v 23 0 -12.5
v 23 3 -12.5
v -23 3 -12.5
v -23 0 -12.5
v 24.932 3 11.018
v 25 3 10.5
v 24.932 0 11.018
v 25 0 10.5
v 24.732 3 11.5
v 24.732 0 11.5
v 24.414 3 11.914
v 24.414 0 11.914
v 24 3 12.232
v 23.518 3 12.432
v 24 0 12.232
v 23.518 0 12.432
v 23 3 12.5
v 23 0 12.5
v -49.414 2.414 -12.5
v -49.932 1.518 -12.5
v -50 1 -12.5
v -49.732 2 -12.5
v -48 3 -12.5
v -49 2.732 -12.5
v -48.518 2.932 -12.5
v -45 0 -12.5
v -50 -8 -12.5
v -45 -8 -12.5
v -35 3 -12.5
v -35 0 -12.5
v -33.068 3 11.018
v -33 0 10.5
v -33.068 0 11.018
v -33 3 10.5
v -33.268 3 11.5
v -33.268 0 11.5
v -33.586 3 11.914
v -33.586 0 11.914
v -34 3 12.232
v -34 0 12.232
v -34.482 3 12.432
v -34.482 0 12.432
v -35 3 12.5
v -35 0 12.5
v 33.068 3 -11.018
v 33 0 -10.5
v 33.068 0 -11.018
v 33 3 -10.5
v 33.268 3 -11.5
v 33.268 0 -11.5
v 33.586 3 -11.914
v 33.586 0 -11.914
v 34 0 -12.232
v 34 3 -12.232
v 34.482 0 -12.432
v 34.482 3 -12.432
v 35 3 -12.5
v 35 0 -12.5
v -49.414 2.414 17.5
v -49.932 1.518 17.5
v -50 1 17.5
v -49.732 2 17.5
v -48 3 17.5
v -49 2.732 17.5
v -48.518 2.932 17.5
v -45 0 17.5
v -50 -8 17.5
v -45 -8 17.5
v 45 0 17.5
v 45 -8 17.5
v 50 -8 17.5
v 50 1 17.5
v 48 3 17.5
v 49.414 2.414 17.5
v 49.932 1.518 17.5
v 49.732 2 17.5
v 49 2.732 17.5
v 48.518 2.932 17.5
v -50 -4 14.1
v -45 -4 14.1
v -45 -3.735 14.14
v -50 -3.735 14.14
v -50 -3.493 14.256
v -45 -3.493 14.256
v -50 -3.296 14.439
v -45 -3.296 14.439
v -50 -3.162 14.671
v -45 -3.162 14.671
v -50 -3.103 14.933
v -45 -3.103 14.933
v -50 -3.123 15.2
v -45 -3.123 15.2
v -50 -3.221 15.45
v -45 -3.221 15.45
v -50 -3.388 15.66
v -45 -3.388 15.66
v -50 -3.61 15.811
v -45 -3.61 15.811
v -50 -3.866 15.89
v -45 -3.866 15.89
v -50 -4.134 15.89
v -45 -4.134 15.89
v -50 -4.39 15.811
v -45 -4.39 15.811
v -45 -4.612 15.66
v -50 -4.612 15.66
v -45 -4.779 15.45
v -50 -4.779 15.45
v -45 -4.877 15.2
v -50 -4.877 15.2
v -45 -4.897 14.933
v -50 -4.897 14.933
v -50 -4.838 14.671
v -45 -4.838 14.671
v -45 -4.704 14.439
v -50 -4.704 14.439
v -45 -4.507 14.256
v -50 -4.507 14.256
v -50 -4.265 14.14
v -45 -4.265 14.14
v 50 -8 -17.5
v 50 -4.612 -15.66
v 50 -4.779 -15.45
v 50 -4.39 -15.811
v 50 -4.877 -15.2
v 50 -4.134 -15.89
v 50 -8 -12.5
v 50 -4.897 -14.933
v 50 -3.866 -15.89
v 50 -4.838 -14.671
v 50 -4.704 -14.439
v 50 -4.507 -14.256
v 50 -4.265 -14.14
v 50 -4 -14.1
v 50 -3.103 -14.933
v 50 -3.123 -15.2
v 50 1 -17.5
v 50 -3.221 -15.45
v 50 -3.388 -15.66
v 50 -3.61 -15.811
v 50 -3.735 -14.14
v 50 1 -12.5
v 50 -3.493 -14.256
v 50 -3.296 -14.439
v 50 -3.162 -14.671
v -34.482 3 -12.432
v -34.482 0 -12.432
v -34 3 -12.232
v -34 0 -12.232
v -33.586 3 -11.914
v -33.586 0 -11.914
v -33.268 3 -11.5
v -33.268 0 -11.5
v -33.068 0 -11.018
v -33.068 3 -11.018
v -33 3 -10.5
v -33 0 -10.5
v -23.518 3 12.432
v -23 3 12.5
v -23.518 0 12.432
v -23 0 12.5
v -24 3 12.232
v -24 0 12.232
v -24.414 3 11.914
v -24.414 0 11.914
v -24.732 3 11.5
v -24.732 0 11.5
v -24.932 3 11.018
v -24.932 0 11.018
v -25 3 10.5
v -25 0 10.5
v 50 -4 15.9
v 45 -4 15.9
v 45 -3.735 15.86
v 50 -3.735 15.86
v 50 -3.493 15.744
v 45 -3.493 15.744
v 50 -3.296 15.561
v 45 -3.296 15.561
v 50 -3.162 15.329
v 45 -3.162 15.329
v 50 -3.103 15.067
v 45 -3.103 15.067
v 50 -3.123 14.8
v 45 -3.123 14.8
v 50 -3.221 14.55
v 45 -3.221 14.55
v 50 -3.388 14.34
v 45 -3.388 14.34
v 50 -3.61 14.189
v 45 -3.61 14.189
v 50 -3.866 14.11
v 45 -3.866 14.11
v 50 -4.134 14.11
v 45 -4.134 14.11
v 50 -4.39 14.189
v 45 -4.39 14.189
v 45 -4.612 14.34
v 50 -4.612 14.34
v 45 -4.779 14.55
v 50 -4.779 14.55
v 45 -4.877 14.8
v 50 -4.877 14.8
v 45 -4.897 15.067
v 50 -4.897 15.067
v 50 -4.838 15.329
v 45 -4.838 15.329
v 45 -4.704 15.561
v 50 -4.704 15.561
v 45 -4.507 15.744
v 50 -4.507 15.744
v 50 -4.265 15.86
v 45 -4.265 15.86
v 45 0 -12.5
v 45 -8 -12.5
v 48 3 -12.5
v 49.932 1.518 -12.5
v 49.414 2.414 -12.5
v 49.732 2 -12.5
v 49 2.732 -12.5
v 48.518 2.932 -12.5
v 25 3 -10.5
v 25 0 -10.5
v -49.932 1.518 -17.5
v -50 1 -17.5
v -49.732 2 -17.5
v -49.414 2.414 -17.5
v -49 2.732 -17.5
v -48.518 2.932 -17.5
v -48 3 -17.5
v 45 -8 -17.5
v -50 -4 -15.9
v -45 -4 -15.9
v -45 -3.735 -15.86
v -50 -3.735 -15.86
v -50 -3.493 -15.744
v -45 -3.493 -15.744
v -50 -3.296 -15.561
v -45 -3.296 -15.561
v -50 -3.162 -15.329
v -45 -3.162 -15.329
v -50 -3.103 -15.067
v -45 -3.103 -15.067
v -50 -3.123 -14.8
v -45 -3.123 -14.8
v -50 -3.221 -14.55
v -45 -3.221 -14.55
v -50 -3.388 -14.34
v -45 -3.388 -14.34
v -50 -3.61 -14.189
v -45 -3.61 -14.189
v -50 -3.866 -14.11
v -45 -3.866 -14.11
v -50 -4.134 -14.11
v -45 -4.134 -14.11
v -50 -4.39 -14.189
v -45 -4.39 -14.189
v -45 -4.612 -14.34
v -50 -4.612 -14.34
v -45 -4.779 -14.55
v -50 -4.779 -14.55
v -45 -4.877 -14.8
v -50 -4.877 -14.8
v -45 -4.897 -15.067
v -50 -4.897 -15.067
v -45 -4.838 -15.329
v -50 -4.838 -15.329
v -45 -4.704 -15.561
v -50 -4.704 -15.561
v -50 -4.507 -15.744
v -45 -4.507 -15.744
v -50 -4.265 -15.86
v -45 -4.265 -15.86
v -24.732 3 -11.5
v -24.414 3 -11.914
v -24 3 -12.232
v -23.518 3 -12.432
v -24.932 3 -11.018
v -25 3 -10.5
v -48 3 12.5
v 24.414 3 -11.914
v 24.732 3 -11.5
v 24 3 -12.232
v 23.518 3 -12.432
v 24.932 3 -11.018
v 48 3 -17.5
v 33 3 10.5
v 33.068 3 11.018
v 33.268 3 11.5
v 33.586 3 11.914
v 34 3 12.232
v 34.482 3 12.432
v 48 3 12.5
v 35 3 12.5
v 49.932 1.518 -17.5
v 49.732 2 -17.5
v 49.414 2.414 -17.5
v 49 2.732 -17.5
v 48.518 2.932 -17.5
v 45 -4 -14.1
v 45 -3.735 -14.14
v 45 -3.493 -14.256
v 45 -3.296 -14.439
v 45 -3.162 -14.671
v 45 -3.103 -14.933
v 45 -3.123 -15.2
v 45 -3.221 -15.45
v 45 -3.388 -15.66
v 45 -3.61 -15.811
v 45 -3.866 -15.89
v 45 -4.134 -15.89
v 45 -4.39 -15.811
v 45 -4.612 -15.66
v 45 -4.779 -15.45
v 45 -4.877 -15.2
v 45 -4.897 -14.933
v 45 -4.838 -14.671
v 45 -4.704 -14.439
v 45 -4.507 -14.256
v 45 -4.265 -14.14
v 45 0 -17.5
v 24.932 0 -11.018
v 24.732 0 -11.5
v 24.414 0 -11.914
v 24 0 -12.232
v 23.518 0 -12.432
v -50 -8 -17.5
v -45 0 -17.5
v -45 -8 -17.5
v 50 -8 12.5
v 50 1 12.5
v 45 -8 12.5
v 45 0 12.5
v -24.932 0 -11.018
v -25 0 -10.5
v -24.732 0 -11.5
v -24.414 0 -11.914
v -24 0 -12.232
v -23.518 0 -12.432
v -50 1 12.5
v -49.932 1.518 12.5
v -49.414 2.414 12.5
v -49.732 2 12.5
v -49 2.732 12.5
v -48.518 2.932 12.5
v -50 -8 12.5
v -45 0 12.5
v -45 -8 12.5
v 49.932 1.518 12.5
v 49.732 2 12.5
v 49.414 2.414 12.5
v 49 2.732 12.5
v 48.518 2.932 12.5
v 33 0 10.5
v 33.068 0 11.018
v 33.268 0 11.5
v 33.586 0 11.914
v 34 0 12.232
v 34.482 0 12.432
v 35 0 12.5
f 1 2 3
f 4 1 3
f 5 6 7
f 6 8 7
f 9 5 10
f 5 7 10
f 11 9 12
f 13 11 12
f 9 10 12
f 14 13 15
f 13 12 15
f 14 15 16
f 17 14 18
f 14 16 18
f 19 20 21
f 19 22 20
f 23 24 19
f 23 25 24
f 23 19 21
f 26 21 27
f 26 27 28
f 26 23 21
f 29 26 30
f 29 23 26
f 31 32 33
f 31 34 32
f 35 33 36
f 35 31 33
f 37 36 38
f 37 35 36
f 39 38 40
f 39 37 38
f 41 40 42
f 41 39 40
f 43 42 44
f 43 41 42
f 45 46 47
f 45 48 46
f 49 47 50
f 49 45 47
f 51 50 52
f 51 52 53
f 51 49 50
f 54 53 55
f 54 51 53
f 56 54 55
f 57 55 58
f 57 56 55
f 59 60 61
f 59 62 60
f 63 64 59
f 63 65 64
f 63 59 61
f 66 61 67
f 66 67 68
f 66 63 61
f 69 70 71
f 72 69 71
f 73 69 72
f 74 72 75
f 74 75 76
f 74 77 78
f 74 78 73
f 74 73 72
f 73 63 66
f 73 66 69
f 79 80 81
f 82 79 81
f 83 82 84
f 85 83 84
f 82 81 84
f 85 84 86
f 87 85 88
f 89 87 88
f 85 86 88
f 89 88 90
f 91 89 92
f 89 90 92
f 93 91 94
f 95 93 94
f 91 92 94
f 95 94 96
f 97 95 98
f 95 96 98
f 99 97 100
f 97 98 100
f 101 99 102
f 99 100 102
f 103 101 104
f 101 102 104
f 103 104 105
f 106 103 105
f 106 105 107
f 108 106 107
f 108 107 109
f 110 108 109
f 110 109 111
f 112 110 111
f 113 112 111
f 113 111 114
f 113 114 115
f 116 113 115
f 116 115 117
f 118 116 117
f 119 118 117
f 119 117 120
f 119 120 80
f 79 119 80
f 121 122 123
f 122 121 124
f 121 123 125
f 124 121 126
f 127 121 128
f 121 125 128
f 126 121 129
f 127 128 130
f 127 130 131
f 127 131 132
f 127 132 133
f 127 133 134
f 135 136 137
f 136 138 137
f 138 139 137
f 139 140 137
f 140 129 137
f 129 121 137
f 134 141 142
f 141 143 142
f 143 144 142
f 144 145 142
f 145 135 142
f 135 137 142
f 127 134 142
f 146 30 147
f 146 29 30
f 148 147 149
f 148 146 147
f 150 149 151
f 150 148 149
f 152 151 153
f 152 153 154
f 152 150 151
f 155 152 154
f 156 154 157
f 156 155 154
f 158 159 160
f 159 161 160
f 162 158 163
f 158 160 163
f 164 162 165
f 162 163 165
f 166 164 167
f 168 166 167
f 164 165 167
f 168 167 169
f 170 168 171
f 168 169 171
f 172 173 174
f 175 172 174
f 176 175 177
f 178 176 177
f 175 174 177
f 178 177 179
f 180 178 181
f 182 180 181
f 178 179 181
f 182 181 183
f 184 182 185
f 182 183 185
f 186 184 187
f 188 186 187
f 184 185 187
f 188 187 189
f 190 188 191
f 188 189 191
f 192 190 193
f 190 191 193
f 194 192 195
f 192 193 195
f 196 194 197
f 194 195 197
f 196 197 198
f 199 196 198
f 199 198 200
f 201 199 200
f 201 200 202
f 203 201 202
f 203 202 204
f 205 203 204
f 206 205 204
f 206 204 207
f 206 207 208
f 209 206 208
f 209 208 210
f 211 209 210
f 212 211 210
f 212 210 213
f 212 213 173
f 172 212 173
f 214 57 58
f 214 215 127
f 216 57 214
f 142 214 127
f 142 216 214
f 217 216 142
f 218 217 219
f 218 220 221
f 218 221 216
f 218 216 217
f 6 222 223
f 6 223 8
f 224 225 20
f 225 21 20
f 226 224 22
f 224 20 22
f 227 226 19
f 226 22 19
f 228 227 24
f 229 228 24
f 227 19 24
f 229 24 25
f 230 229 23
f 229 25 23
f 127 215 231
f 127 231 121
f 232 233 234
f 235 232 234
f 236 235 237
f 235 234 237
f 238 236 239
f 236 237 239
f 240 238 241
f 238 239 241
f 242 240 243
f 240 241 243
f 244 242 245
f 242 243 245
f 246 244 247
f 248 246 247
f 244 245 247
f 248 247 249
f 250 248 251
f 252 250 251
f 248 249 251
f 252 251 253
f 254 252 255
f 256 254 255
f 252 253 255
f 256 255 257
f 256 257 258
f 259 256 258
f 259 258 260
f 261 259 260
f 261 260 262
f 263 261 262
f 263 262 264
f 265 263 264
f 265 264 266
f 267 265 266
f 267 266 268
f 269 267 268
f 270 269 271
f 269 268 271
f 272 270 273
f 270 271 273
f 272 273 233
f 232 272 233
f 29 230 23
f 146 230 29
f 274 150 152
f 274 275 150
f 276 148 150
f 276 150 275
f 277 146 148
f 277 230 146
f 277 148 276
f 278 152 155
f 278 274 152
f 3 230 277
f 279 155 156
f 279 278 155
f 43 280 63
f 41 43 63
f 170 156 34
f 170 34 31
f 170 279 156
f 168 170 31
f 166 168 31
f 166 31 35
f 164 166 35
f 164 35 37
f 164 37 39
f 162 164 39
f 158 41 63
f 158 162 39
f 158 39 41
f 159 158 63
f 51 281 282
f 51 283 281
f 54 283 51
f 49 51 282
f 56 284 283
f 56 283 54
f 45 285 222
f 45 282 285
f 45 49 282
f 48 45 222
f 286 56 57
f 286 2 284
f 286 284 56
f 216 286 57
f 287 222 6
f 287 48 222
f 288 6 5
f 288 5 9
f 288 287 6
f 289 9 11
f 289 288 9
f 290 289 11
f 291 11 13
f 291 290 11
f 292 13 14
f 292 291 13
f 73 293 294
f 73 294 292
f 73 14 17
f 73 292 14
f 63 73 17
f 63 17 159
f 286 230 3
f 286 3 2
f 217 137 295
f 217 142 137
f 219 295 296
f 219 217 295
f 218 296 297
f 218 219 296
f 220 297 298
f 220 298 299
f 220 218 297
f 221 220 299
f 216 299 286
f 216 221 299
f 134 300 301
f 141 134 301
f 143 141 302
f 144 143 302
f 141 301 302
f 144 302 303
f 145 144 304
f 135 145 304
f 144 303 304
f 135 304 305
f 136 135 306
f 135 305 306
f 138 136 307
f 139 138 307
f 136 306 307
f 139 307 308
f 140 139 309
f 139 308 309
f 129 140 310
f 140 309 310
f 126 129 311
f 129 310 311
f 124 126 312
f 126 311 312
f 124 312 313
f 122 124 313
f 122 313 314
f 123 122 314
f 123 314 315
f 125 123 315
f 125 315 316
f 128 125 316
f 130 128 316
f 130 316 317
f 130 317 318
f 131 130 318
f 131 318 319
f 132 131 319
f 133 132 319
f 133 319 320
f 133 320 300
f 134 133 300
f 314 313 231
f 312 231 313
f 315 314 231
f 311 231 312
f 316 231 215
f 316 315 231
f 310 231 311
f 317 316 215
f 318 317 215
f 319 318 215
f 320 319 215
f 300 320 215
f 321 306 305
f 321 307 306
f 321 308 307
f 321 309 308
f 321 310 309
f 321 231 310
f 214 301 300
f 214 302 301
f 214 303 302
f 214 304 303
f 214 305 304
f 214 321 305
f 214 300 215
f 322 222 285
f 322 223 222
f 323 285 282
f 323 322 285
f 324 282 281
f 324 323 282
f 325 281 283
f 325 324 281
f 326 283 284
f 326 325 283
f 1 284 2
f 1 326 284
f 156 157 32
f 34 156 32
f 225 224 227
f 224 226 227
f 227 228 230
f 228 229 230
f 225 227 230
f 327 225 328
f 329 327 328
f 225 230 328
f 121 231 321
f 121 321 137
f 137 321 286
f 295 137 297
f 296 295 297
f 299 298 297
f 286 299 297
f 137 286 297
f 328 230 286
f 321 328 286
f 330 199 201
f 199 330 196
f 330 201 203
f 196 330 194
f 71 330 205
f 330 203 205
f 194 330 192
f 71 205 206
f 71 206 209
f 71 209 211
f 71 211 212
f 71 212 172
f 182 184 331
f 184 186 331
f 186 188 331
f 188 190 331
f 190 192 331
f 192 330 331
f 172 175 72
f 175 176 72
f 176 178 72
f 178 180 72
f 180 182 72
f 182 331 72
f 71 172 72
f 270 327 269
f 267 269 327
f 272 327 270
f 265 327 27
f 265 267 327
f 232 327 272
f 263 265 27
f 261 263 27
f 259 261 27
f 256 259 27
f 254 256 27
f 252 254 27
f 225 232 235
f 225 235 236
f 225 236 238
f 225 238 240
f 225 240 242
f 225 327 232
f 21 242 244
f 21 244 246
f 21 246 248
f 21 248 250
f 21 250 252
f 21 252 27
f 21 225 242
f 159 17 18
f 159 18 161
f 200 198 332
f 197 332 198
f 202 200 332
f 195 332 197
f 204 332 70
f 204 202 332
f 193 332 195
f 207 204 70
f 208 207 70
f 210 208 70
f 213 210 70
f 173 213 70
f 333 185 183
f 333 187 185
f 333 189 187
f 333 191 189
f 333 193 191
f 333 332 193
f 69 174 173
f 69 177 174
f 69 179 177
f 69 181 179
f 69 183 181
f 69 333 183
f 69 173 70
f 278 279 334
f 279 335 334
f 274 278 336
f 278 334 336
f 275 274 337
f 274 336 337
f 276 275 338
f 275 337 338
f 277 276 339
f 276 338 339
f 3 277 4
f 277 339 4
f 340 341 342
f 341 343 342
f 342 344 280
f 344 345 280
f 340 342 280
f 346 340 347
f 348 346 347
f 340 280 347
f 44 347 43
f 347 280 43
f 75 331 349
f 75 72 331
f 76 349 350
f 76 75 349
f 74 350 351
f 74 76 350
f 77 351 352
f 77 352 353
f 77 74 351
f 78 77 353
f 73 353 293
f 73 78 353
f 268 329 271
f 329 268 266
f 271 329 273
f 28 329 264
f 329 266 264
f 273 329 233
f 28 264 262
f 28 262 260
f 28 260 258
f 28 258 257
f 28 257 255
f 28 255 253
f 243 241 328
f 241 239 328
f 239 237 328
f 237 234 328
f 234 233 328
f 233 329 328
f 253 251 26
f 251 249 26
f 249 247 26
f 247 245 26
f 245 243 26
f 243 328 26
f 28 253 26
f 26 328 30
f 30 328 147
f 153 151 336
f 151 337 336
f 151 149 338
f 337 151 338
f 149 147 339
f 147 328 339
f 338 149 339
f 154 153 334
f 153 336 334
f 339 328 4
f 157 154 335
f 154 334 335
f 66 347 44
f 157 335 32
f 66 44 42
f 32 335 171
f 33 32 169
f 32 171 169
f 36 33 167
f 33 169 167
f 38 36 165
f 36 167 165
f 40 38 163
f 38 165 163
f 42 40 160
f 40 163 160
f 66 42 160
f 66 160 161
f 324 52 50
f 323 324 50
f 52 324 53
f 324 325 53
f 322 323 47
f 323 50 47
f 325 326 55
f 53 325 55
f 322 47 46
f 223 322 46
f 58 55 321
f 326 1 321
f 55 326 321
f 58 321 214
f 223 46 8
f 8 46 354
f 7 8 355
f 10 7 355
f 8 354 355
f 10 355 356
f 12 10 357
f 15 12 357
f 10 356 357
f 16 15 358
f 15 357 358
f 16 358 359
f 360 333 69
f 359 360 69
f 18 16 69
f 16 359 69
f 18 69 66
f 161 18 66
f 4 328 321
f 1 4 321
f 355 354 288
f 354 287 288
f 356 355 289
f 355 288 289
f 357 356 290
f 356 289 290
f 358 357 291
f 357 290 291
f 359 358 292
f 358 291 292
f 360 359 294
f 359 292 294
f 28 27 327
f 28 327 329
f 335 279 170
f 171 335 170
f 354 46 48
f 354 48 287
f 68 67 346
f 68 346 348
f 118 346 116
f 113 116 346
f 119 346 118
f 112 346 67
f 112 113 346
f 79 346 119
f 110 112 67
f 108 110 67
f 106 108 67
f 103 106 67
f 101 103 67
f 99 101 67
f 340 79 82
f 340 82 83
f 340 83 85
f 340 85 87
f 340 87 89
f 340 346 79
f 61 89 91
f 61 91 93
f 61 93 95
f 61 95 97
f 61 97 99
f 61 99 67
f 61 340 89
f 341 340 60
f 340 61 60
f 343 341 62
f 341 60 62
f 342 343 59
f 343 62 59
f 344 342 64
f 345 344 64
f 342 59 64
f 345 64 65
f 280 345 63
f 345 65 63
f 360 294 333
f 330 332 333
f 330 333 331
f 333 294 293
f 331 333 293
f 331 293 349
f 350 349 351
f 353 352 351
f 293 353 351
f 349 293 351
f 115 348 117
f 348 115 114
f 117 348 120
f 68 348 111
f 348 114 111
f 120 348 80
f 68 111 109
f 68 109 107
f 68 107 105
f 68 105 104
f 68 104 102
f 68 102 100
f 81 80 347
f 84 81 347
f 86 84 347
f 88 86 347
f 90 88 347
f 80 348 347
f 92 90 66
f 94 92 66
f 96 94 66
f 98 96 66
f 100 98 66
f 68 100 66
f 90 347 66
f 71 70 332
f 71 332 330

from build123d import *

# Parameters (mm, degrees)
SKETCH_1_W                  = 100
SKETCH_1_H                  = 35
EXTRUDE_1_DEPTH             = 3
SKETCH_2_W                  = 17
SKETCH_2_H                  = 25
CUT_EXTRUDE_1_DEPTH         = 54.058929503
SKETCH_3_W                  = 5
SKETCH_3_H                  = 5
EXTRUDE_2_DEPTH             = 8
SKETCH_4_W                  = 5
SKETCH_4_H                  = 5
EXTRUDE_3_DEPTH             = 8
SKETCH_5_W                  = 17
SKETCH_5_H                  = 30
CUT_EXTRUDE_2_DEPTH         = 54.574714185
SKETCH_6_W                  = 5
SKETCH_6_H                  = 5
EXTRUDE_4_DEPTH             = 8
SKETCH_7_W                  = 5
SKETCH_7_H                  = 3
EXTRUDE_5_DEPTH             = 17
SKETCH_8_W                  = 5
SKETCH_8_H                  = 5
EXTRUDE_6_DEPTH             = 8
SKETCH_9_W                  = 50
SKETCH_9_H                  = 25
CUT_EXTRUDE_3_DEPTH         = 55.104066391
HOLE_WIZARD_1_8_1_8_1_D     = 1.8
HOLE_WIZARD_1_8_1_8_1_DEPTH = 5
HOLE_WIZARD_1_8_1_8_2_D     = 1.8
HOLE_WIZARD_1_8_1_8_2_DEPTH = 100
FILLET_1_R                  = 2


with BuildPart() as part:
    # 草图1 → 凸台-拉伸1 (new body)
    with BuildSketch(Plane.XZ):
        Rectangle(SKETCH_1_W, SKETCH_1_H)
    extrude(amount=-EXTRUDE_1_DEPTH)

    # 草图2 → 切除-拉伸1 (cut, through all)
    with BuildSketch(Plane.XZ):
        with Locations((41.5, 0)):
            Rectangle(SKETCH_2_W, SKETCH_2_H)
    extrude(amount=-CUT_EXTRUDE_1_DEPTH, mode=Mode.SUBTRACT)

    # 草图3 → 凸台-拉伸2 (add)
    with BuildSketch(Plane.XZ):
        with Locations((47.5, -15)):
            Rectangle(SKETCH_3_W, SKETCH_3_H)
    extrude(amount=EXTRUDE_2_DEPTH)

    # 草图4 → 凸台-拉伸3 (add)
    with BuildSketch(Plane.XZ):
        with Locations((47.5, 15)):
            Rectangle(SKETCH_4_W, SKETCH_4_H)
    extrude(amount=EXTRUDE_3_DEPTH)

    # 草图5 → 切除-拉伸2 (cut, through all)
    with BuildSketch(Plane.XZ):
        with Locations((-41.5, 2.5)):
            Rectangle(SKETCH_5_W, SKETCH_5_H)
    extrude(amount=-CUT_EXTRUDE_2_DEPTH, mode=Mode.SUBTRACT)

    # 草图6 → 凸台-拉伸4 (add)
    with BuildSketch(Plane.XZ):
        with Locations((-47.5, -15)):
            Rectangle(SKETCH_6_W, SKETCH_6_H)
    extrude(amount=EXTRUDE_4_DEPTH)

    # 草图7 → 凸台-拉伸5 (add)
    with BuildSketch(Plane.ZY.offset(33)):
        with Locations((15, 1.5)):
            Rectangle(SKETCH_7_W, SKETCH_7_H)
    extrude(amount=EXTRUDE_5_DEPTH)

    # 草图8 → 凸台-拉伸6 (add)
    with BuildSketch(Plane.XZ):
        with Locations((-47.5, 15)):
            Rectangle(SKETCH_8_W, SKETCH_8_H)
    extrude(amount=EXTRUDE_6_DEPTH)

    # 草图9 → 切除-拉伸3 (cut, through all)
    with BuildSketch(Plane(origin=(0, 3, 0), x_dir=(-1, 0, 0), z_dir=(0, 1, 0))):
        Rectangle(SKETCH_9_W, SKETCH_9_H)
    extrude(amount=-CUT_EXTRUDE_3_DEPTH, mode=Mode.SUBTRACT)

    # Ø1.8 (1.8) 直径孔1
    with Locations(Plane.ZY.offset(50)):
        with Locations((15, -4), (-15, -4)):
            Hole(HOLE_WIZARD_1_8_1_8_1_D / 2, depth=HOLE_WIZARD_1_8_1_8_1_DEPTH)

    # Ø1.8 (1.8) 直径孔2
    with Locations(Plane(origin=(50, 0, 0), x_dir=(0, 0, -1), z_dir=(1, 0, 0))):
        with Locations((15, -4), (-15, -4)):
            Hole(HOLE_WIZARD_1_8_1_8_2_D / 2, depth=HOLE_WIZARD_1_8_1_8_2_DEPTH)

    # 圆角1
    fillet_1_edges = [part.edges().sort_by_distance(p)[0] for p in [
        (-25, 1.5, -12.5),
        (25, 1.5, -12.5),
        (25, 1.5, 12.5),
        (-25, 1.5, 12.5),
        (50, 3, 15),
        (33, 1.5, -12.5),
        (33, 1.5, 12.5),
        (50, 3, -15),
        (-50, 3, -15),
        (-33, 1.5, -12.5),
        (-33, 1.5, 12.5),
        (-50, 3, 15),
    ]]
    fillet(fillet_1_edges, radius=FILLET_1_R)


solid = part.part
